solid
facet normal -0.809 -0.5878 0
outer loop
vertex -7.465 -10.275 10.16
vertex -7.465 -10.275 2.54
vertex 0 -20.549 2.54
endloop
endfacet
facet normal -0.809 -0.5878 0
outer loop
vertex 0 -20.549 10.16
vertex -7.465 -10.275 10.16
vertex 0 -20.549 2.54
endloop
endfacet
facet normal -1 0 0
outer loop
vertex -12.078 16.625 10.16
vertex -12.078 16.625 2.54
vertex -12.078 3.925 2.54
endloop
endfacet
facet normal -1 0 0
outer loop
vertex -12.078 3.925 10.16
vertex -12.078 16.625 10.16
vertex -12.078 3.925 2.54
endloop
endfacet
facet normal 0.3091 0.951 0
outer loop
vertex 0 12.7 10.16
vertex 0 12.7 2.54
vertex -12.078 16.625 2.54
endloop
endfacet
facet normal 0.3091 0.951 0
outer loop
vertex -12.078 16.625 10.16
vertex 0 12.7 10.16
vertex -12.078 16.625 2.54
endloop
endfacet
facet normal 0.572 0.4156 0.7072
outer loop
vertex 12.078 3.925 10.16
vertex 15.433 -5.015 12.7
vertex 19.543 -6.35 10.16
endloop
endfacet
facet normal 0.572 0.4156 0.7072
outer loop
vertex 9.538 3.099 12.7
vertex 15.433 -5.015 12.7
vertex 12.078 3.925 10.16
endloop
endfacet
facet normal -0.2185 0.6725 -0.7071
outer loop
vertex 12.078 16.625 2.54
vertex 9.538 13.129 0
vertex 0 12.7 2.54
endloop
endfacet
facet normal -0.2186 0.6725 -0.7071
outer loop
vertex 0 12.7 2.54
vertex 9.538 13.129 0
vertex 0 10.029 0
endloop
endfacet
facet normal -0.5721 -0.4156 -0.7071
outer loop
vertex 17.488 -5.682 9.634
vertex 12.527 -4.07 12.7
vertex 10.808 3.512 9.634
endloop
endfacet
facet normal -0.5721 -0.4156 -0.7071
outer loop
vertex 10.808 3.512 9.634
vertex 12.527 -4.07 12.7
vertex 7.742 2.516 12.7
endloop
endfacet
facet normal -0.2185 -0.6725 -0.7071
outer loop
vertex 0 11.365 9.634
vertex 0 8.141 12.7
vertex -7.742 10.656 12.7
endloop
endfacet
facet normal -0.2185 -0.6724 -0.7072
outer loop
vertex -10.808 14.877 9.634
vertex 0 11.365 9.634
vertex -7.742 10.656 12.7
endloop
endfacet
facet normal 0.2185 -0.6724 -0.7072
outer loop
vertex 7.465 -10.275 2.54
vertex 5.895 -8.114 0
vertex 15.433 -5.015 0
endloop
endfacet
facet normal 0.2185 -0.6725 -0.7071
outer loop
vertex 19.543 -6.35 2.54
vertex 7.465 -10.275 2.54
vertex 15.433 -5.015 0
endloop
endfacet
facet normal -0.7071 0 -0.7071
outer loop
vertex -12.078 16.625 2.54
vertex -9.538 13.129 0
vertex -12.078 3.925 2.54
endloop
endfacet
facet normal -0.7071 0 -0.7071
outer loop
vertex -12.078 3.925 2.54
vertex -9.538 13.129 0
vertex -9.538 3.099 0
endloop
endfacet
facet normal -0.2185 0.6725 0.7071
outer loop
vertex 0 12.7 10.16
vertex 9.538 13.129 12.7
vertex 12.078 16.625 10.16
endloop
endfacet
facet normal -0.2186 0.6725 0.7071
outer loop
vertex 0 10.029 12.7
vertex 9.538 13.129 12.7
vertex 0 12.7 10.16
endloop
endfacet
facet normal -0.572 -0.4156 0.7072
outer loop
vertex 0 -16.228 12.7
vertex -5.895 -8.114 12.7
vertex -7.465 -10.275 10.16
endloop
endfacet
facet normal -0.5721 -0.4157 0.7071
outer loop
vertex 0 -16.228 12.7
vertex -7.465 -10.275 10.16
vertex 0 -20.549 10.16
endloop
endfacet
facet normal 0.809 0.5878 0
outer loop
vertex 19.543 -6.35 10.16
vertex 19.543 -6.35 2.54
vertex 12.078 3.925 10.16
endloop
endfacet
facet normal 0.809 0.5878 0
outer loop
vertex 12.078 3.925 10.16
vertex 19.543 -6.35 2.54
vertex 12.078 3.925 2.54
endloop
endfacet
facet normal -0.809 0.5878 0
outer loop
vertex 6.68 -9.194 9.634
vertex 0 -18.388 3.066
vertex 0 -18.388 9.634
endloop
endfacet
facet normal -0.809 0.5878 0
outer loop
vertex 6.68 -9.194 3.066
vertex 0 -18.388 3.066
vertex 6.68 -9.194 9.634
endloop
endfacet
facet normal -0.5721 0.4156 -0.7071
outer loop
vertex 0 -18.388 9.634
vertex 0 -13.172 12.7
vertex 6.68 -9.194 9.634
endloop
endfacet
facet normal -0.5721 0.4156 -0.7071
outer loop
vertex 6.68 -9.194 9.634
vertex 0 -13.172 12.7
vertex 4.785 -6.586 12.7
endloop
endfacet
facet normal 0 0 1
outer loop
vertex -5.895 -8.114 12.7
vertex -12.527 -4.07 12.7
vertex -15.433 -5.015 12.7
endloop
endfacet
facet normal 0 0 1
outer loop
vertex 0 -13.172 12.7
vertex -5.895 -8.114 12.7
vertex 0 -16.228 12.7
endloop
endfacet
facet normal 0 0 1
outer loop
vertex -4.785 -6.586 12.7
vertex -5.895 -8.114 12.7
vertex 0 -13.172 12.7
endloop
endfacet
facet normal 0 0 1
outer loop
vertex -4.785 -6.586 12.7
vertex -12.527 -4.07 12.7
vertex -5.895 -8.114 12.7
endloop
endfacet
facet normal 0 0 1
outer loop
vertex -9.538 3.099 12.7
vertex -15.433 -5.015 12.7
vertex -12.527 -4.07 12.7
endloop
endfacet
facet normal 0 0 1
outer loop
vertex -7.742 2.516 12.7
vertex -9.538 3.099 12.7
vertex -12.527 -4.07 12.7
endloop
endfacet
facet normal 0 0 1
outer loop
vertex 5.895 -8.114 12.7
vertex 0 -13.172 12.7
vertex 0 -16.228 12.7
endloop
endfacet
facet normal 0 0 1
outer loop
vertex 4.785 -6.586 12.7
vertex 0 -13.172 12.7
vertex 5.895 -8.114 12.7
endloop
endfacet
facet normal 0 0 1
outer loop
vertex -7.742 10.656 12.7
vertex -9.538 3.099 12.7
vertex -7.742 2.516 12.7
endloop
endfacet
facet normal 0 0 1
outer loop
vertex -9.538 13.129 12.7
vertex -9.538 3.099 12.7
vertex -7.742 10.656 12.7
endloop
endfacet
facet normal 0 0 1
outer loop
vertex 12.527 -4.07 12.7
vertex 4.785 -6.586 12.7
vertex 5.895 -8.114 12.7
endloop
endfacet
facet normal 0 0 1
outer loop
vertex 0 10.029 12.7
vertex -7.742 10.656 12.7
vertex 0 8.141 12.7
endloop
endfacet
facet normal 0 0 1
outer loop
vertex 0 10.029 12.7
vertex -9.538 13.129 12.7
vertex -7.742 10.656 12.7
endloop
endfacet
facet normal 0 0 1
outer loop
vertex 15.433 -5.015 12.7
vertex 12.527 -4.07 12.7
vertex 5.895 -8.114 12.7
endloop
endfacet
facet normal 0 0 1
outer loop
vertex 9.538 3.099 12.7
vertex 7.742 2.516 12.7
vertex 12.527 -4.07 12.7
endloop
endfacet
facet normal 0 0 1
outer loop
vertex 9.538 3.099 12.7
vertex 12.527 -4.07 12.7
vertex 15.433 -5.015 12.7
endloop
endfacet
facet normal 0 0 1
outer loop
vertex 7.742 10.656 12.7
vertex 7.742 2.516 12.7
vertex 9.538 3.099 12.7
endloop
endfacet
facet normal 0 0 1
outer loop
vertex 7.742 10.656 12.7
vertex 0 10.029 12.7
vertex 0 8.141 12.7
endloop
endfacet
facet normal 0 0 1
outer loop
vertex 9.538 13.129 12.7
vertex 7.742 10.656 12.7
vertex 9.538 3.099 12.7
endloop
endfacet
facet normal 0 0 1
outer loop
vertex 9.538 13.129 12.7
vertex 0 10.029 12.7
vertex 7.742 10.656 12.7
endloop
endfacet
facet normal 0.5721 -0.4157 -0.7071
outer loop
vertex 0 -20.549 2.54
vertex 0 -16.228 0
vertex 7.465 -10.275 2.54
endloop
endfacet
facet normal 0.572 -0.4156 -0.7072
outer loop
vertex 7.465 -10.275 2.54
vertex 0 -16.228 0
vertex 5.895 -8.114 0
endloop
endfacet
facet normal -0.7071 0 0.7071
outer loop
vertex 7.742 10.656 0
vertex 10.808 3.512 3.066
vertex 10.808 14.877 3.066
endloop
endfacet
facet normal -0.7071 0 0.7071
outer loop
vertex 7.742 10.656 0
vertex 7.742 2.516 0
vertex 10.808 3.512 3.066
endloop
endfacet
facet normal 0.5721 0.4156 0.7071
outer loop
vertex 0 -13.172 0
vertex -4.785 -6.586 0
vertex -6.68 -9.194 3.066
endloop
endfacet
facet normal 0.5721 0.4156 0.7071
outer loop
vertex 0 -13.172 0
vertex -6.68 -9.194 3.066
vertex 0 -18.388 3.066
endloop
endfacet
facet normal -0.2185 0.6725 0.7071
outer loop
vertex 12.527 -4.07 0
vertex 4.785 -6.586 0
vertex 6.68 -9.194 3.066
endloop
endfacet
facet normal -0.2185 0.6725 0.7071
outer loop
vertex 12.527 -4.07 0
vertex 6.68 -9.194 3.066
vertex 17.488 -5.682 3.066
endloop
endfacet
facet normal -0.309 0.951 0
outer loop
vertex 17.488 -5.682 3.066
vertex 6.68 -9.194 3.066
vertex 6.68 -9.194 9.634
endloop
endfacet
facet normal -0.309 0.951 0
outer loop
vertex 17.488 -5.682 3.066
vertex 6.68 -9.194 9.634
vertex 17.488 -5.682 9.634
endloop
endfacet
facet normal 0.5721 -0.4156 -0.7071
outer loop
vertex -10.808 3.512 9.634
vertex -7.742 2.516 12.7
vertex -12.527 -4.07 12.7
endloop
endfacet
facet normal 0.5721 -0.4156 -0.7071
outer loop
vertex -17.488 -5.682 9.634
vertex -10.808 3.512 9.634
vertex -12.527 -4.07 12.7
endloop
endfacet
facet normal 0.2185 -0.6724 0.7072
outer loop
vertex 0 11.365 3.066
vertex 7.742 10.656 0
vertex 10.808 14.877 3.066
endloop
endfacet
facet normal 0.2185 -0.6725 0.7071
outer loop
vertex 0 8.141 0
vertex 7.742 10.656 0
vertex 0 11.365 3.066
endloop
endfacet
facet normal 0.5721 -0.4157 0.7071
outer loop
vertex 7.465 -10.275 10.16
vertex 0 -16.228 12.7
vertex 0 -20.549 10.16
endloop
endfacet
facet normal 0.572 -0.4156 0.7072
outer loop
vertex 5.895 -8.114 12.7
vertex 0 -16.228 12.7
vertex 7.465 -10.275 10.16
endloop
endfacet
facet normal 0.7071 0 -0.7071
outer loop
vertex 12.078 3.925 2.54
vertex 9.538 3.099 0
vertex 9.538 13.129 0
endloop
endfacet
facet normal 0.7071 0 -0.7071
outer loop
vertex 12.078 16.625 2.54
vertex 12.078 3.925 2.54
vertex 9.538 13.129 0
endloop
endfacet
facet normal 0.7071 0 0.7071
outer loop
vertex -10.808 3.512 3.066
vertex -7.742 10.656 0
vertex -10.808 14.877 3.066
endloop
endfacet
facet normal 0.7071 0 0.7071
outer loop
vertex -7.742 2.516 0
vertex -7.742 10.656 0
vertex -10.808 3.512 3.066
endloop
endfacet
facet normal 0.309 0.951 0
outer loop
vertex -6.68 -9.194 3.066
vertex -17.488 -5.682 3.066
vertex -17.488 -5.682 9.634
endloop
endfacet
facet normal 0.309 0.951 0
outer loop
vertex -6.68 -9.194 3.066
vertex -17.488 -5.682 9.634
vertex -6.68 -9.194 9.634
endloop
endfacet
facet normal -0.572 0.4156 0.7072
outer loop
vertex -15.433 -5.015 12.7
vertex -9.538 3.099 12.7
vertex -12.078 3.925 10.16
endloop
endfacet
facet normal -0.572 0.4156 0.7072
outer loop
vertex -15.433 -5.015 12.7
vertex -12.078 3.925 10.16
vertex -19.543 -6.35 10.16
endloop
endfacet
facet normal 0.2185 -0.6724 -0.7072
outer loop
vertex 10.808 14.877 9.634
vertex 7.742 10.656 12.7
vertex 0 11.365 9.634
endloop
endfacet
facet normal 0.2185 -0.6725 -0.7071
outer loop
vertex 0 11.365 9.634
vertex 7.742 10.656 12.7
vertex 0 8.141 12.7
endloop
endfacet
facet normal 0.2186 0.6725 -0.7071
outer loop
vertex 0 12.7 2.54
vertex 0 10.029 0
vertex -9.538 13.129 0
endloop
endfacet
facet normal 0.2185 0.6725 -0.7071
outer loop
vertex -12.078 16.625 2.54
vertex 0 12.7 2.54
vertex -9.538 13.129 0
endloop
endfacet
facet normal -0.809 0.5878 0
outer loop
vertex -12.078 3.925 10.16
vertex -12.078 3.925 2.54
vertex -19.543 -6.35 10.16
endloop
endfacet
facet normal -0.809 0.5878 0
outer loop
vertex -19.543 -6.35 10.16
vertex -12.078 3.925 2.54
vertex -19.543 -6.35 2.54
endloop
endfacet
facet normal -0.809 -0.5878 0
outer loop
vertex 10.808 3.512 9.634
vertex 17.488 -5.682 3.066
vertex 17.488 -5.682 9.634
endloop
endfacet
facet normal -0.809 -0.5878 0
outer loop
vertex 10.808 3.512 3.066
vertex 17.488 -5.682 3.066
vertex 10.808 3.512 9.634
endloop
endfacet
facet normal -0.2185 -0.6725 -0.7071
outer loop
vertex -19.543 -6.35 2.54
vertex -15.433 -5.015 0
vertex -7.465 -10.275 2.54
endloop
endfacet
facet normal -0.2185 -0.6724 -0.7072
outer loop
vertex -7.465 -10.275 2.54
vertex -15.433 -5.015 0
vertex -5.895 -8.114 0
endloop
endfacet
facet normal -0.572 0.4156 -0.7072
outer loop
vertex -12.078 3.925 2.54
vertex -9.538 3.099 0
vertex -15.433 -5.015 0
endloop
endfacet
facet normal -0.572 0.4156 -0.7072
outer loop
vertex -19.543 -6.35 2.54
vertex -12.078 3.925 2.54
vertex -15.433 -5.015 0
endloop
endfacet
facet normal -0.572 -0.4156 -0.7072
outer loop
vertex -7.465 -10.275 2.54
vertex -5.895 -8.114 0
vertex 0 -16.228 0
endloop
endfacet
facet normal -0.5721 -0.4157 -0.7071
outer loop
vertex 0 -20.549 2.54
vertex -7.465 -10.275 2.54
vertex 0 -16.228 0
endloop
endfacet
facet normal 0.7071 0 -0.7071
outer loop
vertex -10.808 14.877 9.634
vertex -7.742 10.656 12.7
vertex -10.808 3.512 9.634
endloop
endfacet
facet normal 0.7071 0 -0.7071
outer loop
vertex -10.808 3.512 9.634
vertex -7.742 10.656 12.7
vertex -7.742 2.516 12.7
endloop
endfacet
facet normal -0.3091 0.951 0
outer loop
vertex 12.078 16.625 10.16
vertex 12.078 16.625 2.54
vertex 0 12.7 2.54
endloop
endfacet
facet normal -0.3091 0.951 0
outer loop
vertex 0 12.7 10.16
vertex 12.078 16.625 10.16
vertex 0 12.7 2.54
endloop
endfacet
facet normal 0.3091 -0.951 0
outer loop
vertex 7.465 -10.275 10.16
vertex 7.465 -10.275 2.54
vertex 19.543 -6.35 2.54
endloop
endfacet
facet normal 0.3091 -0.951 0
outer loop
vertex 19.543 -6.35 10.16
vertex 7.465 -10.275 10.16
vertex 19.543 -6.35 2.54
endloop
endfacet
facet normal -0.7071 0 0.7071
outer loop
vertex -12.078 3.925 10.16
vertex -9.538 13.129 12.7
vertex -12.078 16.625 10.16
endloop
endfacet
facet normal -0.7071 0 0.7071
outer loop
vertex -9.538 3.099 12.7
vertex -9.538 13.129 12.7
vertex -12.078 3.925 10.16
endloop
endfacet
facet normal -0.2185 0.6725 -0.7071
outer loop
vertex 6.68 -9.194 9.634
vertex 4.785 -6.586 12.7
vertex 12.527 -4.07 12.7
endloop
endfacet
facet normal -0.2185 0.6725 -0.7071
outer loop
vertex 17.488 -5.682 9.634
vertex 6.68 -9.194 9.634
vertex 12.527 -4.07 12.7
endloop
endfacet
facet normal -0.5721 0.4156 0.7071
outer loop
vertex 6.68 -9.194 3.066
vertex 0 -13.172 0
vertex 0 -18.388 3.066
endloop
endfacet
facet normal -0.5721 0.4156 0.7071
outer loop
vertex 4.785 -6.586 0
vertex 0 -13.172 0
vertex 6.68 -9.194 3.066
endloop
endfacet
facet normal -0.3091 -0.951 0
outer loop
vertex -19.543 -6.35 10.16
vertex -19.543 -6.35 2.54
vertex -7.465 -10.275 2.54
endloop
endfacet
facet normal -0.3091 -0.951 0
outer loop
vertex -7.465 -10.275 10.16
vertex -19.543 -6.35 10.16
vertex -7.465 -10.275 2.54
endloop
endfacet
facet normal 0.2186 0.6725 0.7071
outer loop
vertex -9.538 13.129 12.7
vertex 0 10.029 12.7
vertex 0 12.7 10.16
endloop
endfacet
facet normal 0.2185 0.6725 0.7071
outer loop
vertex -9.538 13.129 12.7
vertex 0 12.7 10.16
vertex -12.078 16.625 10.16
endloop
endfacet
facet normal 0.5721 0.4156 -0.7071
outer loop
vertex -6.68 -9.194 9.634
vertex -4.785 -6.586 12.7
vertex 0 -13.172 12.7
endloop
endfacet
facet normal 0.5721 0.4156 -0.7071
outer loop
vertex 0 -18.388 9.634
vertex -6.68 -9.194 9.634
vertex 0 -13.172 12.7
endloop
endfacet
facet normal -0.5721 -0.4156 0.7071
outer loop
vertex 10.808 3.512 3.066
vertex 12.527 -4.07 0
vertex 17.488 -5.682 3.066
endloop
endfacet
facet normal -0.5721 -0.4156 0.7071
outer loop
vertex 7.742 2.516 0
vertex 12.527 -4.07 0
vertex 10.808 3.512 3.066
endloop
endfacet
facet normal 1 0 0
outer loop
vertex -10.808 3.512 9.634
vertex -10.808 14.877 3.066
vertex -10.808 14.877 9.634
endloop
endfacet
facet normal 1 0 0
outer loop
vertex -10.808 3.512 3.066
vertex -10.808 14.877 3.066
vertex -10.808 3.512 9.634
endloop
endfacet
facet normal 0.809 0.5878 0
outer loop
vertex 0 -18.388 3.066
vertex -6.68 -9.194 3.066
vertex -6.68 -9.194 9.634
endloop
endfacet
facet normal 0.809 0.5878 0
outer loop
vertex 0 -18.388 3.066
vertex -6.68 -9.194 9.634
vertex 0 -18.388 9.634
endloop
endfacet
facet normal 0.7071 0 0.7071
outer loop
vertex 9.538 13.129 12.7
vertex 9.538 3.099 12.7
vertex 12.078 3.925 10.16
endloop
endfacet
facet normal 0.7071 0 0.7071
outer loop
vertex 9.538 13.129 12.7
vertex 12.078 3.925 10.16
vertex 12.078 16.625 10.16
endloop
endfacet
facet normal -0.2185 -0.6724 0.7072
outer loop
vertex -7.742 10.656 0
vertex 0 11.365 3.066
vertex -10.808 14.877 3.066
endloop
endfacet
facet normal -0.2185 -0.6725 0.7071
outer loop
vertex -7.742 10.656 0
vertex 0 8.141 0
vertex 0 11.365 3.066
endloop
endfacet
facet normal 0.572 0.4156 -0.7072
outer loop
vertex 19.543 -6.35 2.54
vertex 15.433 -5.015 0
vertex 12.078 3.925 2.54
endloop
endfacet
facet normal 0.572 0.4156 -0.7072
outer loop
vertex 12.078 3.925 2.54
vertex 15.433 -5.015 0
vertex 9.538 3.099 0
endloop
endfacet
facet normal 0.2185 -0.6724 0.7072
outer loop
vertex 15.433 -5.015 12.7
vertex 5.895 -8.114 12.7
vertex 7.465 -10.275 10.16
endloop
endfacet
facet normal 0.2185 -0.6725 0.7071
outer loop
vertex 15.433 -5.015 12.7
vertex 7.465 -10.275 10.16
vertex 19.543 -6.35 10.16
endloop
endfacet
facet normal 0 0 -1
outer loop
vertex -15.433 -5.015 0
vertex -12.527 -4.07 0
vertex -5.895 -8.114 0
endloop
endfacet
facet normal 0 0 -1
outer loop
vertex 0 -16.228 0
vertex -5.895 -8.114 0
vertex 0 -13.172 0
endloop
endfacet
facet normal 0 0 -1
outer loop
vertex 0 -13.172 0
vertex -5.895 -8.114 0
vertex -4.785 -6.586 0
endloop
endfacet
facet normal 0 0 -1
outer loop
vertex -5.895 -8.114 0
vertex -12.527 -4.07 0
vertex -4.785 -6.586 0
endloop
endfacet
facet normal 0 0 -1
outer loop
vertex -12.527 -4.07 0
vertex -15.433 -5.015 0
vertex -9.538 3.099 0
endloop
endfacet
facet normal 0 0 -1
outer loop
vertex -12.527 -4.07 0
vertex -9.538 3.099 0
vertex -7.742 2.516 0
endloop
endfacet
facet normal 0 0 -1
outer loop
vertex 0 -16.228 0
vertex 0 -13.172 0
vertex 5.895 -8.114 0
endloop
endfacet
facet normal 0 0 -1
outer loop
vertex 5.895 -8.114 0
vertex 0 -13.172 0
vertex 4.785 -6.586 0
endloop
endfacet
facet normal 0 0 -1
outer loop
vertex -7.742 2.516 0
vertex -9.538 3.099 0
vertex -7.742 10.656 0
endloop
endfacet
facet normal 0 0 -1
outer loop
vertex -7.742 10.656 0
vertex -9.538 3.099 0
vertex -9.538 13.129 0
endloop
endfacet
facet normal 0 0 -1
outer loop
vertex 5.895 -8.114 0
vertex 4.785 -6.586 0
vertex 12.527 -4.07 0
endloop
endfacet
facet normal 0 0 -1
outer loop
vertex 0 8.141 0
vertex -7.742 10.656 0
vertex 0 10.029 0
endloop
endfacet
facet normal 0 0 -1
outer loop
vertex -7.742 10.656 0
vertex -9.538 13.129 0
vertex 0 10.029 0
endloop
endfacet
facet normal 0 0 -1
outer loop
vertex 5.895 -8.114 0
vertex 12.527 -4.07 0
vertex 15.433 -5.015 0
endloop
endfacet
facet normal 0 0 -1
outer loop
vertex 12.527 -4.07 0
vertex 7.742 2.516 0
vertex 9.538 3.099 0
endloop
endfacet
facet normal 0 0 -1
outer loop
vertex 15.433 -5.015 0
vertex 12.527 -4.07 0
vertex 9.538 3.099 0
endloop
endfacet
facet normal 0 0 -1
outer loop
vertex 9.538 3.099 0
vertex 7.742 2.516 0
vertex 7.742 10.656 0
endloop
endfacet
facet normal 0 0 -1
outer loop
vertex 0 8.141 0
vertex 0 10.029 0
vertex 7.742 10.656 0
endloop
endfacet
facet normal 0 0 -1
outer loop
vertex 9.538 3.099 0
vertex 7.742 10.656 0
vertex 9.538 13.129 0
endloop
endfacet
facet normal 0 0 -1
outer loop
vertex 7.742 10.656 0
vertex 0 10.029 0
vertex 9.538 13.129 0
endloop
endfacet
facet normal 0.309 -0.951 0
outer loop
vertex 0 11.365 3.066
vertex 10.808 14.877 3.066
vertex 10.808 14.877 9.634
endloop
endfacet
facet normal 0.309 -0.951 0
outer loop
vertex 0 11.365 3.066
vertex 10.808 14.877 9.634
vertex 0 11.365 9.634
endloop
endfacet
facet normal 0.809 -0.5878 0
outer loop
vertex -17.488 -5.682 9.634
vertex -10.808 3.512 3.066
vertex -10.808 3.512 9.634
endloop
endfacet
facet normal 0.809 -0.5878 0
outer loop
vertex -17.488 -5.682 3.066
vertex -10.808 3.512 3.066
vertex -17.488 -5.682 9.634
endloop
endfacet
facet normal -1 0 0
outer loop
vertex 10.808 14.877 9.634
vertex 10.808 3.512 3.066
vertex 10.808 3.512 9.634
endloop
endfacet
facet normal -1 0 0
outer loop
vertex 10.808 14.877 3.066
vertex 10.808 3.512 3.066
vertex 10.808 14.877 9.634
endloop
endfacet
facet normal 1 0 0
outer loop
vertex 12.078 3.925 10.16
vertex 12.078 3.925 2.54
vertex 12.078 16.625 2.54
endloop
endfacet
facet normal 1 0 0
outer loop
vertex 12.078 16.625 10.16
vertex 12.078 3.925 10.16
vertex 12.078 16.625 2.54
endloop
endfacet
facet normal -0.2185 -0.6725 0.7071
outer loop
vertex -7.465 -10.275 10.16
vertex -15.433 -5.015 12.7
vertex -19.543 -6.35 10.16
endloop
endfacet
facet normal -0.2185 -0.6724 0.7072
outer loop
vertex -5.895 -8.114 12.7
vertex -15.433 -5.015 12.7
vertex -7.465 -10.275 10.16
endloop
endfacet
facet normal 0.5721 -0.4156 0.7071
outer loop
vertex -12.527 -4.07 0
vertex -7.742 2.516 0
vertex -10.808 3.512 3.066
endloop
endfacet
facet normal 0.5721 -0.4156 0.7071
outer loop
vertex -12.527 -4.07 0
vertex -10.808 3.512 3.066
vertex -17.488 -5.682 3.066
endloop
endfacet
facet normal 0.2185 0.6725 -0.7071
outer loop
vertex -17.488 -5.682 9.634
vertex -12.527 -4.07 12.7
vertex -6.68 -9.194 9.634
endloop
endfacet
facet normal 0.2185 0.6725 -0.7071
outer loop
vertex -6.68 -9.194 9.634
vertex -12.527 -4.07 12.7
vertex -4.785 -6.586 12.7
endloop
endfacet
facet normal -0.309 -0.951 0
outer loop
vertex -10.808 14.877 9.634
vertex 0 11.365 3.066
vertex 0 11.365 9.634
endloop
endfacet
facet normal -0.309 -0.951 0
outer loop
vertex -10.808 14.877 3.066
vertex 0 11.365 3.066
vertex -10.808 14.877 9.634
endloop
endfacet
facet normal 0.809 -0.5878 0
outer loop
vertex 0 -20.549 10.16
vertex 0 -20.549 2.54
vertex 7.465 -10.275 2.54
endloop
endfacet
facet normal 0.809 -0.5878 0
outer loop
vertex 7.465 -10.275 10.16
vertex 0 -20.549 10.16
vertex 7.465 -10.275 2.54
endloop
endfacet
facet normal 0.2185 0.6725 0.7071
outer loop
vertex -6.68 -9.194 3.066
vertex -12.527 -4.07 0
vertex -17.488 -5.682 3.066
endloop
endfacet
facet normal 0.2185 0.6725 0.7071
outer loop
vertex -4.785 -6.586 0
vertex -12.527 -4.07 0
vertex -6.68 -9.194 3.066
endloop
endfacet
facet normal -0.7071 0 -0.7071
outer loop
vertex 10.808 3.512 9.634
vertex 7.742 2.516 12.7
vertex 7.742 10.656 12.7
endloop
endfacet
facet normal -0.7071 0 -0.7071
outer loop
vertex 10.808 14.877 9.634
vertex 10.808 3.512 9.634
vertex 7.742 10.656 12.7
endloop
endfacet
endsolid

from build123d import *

# Parameters (mm, degrees)
F1_DEPTH = 12.7
F2_SIZE  = 2.54
F3_T     = -1.27


with BuildPart() as f1:
    # F0 (on Top) → F1 (new body)
    with BuildSketch(Plane.XY):
        Polygon((-7.4648727041, -10.2745158286), (0, -20.5490316571), (7.4648727041, -10.2745158286), (19.5432904611, -6.35), (12.0784177569, 3.9245158286), (12.0784177569, 16.6245158286), (0, 12.7), (-12.0784177569, 16.6245158286), (-12.0784177569, 3.9245158286), (-19.5432904611, -6.35), align=None)
    extrude(amount=F1_DEPTH)

    # F2
    f2_edges = [f1.edges().sort_by_distance(p)[0] for p in [
        (-3.732436, -15.411774, 12.7),
        (3.732436, -15.411774, 12.7),
        (13.504082, -8.312258, 12.7),
        (15.810854, -1.212742, 12.7),
        (12.078418, 10.274516, 12.7),
        (6.039209, 14.662258, 12.7),
        (-6.039209, 14.662258, 12.7),
        (-12.078418, 10.274516, 12.7),
        (-15.810854, -1.212742, 12.7),
        (-13.504082, -8.312258, 12.7),
        (-13.504082, -8.312258, 0),
        (-3.732436, -15.411774, 0),
        (3.732436, -15.411774, 0),
        (13.504082, -8.312258, 0),
        (15.810854, -1.212742, 0),
        (12.078418, 10.274516, 0),
        (6.039209, 14.662258, 0),
        (-6.039209, 14.662258, 0),
        (-12.078418, 10.274516, 0),
        (-15.810854, -1.212742, 0),
    ]]
    chamfer(f2_edges, length=F2_SIZE)

    # F3
    f3_openings = [f1.faces().sort_by_distance(p)[0] for p in [
        (0, 0, 0),
        (0, 0, 12.7),
    ]]
    offset(amount=F3_T, openings=f3_openings, kind=Kind.INTERSECTION)


solid = f1.part
